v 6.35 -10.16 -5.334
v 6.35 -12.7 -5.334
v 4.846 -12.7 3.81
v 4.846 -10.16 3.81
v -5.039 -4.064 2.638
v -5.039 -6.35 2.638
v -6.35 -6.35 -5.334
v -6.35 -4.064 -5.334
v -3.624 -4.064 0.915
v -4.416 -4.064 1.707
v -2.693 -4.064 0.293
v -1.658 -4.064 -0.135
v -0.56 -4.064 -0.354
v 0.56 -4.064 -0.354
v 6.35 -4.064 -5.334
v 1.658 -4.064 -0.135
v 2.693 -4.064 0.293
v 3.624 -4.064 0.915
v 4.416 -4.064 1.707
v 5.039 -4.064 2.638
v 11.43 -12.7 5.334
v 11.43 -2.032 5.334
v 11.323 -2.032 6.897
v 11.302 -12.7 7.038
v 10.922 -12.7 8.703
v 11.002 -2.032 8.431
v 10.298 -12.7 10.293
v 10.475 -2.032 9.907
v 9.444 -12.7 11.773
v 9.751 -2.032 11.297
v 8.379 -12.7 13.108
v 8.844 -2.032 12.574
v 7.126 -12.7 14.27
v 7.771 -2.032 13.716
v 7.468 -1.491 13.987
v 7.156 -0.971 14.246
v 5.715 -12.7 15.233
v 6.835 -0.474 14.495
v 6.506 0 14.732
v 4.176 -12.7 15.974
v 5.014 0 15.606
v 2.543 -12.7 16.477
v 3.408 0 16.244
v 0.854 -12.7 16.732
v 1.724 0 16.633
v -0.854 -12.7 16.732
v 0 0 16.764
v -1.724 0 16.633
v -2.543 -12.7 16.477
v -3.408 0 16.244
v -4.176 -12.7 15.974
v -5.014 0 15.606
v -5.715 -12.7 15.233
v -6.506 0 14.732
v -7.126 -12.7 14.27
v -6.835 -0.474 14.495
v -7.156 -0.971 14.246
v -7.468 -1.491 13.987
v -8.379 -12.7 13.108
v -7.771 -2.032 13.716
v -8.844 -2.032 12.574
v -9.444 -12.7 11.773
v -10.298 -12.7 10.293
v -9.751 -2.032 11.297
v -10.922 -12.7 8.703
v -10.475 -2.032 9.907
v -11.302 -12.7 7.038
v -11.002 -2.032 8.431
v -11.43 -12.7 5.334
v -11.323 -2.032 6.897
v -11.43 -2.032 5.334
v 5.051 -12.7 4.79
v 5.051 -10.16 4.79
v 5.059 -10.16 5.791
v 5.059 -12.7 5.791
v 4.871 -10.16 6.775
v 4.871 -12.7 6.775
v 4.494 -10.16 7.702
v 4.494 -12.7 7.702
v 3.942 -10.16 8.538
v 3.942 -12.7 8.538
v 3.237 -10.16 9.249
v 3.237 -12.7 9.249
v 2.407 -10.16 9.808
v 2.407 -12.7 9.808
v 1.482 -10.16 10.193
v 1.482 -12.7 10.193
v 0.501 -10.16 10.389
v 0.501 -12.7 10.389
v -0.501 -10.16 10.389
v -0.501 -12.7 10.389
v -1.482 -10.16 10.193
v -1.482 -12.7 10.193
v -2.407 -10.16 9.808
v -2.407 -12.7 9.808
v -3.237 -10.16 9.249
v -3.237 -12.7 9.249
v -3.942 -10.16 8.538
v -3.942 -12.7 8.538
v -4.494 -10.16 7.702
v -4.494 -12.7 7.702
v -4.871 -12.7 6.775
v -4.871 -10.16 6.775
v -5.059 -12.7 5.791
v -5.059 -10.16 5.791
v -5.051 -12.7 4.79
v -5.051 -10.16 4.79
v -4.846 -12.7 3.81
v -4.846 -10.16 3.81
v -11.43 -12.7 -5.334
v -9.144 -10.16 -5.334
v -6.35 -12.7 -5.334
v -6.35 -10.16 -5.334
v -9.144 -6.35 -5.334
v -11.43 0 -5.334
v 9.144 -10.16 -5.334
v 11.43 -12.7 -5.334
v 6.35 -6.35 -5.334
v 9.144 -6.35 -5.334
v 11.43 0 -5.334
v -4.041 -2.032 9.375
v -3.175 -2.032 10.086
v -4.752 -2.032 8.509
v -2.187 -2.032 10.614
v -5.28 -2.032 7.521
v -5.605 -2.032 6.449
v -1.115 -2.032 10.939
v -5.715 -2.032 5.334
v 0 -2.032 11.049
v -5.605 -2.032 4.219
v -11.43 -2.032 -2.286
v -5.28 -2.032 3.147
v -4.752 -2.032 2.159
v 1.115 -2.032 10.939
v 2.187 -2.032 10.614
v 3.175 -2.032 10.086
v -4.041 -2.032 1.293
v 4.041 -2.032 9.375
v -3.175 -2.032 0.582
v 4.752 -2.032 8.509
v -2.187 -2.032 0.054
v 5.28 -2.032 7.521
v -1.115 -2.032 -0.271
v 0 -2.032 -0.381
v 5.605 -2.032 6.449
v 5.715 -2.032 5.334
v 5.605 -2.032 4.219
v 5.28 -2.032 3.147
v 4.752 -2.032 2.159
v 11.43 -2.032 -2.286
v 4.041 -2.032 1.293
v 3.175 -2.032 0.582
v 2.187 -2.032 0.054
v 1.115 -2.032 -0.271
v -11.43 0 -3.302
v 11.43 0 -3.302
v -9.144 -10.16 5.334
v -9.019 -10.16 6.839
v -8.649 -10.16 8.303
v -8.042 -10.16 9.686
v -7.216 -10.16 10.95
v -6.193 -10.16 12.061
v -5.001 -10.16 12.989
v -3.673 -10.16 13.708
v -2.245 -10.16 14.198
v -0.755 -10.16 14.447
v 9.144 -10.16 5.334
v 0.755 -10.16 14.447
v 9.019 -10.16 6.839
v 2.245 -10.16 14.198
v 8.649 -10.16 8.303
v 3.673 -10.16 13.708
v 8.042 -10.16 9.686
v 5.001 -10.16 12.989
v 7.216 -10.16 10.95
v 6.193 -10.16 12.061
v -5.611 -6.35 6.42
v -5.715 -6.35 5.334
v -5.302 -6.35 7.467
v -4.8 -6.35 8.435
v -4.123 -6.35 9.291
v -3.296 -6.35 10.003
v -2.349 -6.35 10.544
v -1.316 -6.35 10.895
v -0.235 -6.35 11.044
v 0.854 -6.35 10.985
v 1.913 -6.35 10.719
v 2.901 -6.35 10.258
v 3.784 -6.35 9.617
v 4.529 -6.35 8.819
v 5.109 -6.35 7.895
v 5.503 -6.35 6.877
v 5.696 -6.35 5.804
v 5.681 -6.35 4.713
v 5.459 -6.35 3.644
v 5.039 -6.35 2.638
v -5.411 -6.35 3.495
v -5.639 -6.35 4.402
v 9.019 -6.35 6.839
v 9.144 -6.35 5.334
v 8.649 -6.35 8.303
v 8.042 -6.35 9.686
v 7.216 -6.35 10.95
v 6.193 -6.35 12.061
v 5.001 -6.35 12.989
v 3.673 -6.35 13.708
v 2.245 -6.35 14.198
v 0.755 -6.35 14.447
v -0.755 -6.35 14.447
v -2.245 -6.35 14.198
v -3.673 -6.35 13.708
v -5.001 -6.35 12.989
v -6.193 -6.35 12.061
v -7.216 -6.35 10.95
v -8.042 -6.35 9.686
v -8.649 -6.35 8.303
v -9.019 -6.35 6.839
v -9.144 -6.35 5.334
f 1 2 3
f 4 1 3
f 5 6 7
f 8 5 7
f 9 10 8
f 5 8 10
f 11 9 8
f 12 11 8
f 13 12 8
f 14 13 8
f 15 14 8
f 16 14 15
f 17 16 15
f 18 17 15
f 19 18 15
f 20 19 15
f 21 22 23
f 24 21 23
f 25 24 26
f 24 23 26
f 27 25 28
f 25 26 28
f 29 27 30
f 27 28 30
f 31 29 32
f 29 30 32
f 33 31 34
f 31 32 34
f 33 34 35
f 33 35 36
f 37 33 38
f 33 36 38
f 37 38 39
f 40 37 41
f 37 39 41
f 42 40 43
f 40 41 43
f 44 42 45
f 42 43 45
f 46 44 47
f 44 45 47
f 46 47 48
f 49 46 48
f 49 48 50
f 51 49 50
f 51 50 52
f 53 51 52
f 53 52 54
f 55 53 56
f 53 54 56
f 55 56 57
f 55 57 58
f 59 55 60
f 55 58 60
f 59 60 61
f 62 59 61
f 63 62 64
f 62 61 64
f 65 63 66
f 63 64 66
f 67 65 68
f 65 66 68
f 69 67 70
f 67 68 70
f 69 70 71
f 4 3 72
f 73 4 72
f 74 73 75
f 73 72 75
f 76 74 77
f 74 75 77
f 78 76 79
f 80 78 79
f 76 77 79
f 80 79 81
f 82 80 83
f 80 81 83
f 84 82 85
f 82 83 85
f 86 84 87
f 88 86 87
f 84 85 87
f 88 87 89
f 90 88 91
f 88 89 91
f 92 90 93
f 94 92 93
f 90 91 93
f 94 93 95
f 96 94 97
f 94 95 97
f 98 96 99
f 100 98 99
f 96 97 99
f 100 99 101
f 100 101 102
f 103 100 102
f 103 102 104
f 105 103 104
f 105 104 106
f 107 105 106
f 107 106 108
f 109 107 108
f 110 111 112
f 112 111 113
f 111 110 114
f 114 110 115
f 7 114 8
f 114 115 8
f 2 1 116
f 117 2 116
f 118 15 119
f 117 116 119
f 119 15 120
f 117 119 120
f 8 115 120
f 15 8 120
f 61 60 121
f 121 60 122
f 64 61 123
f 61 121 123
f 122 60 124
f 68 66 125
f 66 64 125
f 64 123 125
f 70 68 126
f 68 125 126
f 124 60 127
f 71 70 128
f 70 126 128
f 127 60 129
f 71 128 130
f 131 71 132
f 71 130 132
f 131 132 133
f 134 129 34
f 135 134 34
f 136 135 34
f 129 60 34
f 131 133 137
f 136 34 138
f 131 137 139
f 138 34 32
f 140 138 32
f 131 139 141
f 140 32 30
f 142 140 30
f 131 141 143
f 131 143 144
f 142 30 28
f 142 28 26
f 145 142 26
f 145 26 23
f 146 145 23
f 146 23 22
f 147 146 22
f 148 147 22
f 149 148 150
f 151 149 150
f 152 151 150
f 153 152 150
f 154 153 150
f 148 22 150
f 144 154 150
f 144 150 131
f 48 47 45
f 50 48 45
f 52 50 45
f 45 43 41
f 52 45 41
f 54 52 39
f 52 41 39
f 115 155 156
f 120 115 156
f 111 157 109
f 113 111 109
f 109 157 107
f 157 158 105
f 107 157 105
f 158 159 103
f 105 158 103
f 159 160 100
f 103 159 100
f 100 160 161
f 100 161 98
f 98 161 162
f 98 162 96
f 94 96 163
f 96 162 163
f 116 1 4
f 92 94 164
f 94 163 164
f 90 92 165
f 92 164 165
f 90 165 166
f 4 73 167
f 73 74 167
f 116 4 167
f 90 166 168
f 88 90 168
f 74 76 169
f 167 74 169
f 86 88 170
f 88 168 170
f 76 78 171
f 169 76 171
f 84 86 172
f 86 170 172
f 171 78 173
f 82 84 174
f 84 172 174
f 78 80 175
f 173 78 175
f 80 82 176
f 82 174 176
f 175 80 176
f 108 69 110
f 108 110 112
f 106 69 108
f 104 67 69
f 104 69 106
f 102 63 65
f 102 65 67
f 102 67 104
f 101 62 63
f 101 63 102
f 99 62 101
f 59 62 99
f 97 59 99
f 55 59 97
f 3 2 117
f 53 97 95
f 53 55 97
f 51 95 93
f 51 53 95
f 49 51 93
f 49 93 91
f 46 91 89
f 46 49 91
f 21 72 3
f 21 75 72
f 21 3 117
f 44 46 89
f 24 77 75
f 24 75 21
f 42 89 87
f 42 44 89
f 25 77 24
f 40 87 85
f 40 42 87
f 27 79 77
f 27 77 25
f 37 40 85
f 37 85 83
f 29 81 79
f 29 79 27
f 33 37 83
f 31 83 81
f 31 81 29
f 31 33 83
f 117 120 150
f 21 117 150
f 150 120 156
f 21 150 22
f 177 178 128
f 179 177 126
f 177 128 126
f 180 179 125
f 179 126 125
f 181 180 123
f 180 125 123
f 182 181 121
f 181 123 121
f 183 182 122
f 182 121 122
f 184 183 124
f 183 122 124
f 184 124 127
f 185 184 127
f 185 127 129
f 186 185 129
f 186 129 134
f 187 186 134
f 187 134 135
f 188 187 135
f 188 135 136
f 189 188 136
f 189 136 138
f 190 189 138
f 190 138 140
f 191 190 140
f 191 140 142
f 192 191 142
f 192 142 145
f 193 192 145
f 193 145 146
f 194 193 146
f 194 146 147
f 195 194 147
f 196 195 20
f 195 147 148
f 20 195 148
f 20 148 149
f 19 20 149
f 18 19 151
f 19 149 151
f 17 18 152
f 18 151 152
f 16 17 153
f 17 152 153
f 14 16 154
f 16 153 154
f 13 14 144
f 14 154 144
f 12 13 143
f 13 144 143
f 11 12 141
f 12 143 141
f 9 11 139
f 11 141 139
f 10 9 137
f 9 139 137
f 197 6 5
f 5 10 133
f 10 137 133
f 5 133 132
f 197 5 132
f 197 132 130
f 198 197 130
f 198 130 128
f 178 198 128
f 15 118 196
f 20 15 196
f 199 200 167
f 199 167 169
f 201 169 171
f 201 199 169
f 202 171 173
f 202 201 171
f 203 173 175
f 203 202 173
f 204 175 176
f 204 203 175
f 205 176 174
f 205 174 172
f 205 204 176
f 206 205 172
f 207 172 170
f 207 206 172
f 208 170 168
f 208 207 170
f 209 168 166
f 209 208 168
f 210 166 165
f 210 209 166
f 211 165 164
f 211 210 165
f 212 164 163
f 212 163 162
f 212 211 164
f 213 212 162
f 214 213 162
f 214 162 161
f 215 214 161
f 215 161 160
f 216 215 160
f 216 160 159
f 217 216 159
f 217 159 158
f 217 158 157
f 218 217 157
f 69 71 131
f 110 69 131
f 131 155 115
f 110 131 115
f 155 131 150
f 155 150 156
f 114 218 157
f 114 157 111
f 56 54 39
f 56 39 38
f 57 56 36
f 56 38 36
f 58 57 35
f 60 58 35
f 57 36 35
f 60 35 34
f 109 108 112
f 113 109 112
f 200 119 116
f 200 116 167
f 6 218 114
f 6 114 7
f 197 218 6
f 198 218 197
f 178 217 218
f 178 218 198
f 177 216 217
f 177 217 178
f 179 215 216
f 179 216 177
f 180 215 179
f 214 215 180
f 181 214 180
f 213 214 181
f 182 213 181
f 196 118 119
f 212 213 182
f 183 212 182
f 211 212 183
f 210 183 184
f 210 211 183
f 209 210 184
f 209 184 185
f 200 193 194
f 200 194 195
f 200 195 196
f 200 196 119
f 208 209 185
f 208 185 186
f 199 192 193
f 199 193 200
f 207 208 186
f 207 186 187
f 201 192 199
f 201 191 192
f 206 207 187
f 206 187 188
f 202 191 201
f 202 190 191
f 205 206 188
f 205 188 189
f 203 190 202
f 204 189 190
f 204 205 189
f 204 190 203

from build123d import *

# Parameters (mm, degrees)
F1_DEPTH  = 12.7
F4_DEPTH  = 3.81
F6_DEPTH  = 8.636
F8_DEPTH  = 25.4
F9_R      = 5.715
F10_DEPTH = 4.318


with BuildPart() as f1:
    # F0 (on Front) → F1 (new body)
    with BuildSketch(Plane.XZ):
        with BuildLine():
            Line((-11.43, -5.334), (11.43, -5.334))
            Line((11.43, -5.334), (11.43, 5.334))
            ThreePointArc((11.43, 5.334), (0, 16.764), (-11.43, 5.334))
            Line((-11.43, 5.334), (-11.43, -5.334))
        make_face()
    extrude(amount=F1_DEPTH)

    # F3 (on offset) → F4 (cut)
    with BuildSketch(Plane.XZ.offset(6.35)):
        with BuildLine():
            Line((-9.144, -5.334), (9.144, -5.334))
            Line((9.144, -5.334), (9.144, 5.334))
            ThreePointArc((9.144, 5.334), (0, 14.478), (-9.144, 5.334))
            Line((-9.144, 5.334), (-9.144, -5.334))
        make_face()
    extrude(amount=F4_DEPTH, mode=Mode.SUBTRACT)

    # F5 (on face) → F6 (cut)
    with BuildSketch(Plane.XZ.offset(12.7)):
        with BuildLine():
            Line((6.35, -5.334), (4.846011, 3.81))
            ThreePointArc((4.846011, 3.81), (0, 10.414), (-4.846011, 3.81))
            Line((-4.846011, 3.81), (-6.35, -5.334))
            Line((-6.35, -5.334), (6.35, -5.334))
        make_face()
    extrude(amount=-F6_DEPTH, mode=Mode.SUBTRACT)

    # F7 (on face) → F8 (cut)
    with BuildSketch(Plane.YZ.offset(11.43)):
        Polygon((-2.032, -2.286), (0, -3.302), (0, 14.732), (-2.032, 13.716), align=None)
    extrude(amount=-F8_DEPTH, mode=Mode.SUBTRACT)

    # F9 (on face) → F10 (cut, through all)
    with BuildSketch(Plane(origin=(0, -2.032, 0), x_dir=(-1, 0, 0), z_dir=(0, 1, 0))):
        with Locations((0, 5.334)):
            Circle(F9_R)
    extrude(amount=-F10_DEPTH, mode=Mode.SUBTRACT)


solid = f1.part
